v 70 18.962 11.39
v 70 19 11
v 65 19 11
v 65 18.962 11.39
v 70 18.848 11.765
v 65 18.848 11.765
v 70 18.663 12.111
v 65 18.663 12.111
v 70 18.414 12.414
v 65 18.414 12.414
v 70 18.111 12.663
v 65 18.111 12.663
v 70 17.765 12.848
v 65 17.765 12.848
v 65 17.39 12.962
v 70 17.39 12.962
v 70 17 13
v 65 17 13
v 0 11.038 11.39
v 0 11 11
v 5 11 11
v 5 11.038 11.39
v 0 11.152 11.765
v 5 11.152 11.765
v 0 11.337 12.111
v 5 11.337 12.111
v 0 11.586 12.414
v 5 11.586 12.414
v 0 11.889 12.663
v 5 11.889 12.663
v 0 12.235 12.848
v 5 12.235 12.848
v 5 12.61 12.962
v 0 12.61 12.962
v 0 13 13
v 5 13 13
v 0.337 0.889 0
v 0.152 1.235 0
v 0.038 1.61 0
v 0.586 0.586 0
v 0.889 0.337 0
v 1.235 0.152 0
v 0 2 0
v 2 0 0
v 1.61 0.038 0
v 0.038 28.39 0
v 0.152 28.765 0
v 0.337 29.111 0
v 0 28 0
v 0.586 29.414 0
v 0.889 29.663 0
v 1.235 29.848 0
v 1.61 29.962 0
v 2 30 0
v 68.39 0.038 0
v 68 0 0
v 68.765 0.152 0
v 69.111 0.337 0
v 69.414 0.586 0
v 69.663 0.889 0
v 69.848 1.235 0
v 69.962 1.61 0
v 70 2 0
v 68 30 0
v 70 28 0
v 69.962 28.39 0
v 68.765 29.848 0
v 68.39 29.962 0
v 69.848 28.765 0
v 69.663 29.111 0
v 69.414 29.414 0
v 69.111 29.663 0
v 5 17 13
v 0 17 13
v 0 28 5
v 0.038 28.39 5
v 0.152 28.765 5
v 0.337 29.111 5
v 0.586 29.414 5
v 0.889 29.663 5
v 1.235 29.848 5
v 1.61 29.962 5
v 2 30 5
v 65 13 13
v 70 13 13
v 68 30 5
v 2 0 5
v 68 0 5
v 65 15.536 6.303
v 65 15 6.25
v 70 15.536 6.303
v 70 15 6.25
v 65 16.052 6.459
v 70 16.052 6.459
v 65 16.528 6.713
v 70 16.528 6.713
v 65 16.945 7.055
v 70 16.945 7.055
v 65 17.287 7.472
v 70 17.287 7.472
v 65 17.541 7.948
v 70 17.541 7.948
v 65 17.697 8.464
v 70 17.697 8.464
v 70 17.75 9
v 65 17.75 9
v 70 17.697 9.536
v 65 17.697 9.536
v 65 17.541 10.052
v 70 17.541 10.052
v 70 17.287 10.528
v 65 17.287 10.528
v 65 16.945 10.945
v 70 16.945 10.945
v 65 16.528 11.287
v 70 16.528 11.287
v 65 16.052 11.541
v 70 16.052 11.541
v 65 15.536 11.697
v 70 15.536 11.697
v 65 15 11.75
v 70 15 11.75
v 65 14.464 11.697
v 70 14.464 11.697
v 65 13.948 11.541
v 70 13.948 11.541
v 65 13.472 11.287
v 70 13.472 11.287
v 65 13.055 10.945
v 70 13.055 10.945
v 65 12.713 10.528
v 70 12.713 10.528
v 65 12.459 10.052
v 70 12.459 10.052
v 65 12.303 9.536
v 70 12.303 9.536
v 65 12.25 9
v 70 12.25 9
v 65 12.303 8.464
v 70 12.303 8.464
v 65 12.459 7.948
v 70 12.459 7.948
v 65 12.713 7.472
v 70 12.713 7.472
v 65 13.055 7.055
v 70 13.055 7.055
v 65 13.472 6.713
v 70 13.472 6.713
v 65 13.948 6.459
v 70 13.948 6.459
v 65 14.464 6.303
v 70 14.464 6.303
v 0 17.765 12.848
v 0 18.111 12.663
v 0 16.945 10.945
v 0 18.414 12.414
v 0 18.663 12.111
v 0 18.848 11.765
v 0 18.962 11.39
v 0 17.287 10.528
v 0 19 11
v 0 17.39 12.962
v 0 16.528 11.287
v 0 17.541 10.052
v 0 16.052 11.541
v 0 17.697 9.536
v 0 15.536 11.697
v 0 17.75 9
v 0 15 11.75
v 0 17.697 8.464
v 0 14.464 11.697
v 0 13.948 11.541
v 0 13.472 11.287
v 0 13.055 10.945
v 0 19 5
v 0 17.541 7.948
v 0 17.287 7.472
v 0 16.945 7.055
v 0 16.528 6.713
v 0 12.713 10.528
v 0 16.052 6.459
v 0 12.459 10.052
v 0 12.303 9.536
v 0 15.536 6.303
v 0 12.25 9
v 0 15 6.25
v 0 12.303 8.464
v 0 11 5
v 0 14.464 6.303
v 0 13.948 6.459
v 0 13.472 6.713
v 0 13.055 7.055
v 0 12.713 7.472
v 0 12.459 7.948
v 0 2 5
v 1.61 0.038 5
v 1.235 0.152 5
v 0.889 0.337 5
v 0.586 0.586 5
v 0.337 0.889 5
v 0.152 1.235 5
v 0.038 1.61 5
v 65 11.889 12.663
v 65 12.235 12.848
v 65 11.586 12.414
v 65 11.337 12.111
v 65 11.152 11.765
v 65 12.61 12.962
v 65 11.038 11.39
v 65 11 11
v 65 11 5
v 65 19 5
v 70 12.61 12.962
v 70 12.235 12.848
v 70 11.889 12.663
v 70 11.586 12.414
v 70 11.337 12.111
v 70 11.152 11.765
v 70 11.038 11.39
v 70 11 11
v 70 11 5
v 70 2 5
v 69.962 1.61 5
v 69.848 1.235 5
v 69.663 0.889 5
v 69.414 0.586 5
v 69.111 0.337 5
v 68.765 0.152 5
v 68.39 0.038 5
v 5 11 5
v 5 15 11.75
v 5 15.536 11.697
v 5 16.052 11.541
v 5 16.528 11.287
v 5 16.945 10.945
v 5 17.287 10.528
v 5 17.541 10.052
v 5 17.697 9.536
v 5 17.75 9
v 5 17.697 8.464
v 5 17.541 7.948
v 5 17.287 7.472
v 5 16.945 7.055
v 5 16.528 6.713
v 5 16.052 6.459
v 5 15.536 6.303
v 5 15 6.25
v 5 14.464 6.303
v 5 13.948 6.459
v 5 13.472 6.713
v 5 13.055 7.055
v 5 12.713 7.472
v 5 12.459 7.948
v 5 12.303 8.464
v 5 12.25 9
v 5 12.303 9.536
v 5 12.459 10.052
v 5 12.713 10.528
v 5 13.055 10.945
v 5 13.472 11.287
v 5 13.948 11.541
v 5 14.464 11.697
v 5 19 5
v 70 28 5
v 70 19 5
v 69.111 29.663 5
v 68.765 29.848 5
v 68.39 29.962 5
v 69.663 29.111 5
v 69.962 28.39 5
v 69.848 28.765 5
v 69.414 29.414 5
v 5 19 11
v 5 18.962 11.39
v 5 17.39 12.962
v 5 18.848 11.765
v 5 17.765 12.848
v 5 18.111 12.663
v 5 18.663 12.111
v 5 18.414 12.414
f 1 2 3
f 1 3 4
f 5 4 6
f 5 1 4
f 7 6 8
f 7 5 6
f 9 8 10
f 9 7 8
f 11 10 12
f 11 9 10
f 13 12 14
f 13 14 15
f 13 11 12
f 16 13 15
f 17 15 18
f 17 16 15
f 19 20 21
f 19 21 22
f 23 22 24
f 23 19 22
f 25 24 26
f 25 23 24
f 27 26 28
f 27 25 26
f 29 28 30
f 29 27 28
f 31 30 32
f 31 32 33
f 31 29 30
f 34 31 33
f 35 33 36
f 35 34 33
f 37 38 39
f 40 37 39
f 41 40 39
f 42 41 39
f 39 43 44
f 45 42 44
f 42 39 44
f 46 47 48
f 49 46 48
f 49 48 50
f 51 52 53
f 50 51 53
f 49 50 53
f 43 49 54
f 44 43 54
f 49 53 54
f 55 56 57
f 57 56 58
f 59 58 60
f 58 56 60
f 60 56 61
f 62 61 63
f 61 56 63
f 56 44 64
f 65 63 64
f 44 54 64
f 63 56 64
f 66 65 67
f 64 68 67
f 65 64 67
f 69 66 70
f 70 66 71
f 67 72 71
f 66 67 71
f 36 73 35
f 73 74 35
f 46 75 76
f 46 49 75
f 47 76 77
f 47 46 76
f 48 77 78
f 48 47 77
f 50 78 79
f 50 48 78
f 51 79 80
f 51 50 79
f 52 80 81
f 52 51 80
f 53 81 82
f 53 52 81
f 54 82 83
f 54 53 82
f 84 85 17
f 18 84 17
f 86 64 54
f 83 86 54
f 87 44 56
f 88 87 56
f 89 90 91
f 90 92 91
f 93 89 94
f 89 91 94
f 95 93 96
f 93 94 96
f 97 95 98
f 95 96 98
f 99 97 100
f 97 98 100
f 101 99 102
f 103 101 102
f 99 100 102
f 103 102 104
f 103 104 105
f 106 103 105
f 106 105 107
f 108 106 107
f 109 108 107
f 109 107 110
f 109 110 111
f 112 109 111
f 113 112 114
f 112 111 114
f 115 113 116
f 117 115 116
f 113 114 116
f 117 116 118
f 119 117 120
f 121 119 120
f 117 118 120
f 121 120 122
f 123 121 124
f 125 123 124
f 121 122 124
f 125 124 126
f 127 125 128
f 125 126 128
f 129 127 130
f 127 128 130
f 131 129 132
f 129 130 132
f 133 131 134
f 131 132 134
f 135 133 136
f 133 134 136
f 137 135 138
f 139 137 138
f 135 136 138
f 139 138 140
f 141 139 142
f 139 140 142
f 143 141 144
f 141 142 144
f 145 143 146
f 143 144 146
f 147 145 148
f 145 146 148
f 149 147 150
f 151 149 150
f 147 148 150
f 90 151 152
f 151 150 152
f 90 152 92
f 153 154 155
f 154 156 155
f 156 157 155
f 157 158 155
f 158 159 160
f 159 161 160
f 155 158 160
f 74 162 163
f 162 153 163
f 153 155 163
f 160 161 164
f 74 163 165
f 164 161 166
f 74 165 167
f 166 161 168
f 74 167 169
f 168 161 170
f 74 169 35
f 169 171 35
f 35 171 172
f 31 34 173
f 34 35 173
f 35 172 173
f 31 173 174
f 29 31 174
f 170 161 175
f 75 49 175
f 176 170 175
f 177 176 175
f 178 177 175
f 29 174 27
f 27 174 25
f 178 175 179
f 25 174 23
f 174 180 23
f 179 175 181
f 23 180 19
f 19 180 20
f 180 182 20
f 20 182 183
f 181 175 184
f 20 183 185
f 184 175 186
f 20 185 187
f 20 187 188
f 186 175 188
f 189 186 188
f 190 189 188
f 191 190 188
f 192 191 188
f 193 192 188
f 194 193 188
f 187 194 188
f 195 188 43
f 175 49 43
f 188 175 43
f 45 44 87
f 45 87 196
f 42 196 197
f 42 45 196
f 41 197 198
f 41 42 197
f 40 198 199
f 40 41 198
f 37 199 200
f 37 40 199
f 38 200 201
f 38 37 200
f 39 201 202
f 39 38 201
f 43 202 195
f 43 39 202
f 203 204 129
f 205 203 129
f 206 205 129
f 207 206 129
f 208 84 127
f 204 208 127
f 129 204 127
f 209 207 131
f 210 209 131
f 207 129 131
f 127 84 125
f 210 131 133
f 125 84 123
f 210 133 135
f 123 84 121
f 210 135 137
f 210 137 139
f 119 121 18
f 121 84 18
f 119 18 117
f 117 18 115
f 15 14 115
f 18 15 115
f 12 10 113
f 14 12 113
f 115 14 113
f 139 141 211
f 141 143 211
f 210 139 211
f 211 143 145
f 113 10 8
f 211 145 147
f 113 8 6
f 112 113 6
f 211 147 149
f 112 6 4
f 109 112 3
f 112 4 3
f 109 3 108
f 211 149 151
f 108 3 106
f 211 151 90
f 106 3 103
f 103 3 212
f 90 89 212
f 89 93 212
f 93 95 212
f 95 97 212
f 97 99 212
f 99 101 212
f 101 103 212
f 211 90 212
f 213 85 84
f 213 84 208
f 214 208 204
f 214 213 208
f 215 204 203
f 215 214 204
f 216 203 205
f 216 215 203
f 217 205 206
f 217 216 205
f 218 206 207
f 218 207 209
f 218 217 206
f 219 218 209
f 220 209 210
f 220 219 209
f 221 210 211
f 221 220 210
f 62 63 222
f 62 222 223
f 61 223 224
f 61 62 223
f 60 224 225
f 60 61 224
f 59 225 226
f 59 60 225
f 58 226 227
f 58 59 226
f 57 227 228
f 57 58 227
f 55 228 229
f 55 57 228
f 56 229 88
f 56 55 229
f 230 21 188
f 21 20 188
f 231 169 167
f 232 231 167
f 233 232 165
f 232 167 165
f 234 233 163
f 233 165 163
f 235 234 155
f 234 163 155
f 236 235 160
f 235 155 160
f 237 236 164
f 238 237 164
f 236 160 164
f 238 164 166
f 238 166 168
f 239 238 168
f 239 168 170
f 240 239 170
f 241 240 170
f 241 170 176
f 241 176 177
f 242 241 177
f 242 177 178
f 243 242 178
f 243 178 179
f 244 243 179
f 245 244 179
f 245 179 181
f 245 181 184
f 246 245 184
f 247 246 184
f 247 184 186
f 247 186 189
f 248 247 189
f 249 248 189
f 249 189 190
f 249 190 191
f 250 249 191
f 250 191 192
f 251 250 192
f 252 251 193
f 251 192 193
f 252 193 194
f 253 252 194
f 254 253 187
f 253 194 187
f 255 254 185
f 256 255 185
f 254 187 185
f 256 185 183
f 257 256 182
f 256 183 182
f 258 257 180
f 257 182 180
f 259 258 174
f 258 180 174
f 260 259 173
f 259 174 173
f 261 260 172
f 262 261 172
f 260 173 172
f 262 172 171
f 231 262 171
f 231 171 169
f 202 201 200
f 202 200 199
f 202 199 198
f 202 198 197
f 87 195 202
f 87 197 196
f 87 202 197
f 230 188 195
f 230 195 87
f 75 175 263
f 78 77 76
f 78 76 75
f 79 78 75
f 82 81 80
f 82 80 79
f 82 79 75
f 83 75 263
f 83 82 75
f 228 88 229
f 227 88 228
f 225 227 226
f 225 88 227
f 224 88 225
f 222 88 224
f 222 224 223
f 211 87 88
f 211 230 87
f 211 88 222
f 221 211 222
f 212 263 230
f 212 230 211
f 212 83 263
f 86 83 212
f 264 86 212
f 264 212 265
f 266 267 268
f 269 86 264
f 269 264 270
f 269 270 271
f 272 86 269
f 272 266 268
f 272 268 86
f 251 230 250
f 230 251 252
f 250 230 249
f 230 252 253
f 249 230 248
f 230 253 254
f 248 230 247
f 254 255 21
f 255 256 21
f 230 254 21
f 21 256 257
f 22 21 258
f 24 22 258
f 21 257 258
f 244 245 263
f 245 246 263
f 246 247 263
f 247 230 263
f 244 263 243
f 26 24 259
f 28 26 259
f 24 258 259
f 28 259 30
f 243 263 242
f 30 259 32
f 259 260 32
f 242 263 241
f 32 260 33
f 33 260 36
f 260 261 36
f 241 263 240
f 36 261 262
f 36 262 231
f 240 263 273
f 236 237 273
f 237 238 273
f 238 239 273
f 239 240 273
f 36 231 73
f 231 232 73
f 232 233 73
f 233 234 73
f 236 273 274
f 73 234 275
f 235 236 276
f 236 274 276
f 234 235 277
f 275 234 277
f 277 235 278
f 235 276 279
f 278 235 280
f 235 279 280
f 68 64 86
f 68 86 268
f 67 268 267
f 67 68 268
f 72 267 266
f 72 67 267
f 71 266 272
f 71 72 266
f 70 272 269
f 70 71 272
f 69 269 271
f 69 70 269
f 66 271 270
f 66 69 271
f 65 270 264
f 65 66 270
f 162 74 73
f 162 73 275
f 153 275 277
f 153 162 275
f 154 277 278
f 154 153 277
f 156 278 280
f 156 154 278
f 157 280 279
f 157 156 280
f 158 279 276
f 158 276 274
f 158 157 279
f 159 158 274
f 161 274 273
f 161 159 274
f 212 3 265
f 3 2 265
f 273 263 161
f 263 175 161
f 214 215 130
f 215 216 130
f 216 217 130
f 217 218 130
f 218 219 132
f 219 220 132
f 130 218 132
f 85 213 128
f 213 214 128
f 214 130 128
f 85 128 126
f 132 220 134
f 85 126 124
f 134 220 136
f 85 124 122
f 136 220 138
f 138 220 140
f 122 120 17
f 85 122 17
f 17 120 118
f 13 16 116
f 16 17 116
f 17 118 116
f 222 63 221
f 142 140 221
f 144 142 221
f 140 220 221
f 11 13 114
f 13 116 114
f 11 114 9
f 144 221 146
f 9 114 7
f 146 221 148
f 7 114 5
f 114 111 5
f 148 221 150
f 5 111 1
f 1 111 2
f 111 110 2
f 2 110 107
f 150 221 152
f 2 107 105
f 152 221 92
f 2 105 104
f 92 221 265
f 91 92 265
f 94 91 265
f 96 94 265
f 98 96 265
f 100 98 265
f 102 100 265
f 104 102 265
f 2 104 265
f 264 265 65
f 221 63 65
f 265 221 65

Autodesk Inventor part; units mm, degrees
ref_plane "YZ Plane" through (0, 0, 0) normal (1, 0, 0) x (0, 1, 0)
ref_plane "XZ Plane" through (0, 0, 0) normal (0, 1, 0) x (-1, 0, 0)
ref_plane "XY Plane" through (0, 0, 0) normal (0, 0, 1) x (1, 0, 0)
sketch "Esquisse1" plane through (0, 0, 0) normal (0, 0, 1) x (1, 0, 0)
  line L0 (2, 0) -> (68, 0)
  line L1 (70, 2) -> (70, 28)
  line L2 (68, 30) -> (2, 30)
  line L3 (0, 28) -> (0, 2)
  arc A0 (2, 30) -> (0, 28) centre (2, 28) ccw
  arc A1 (70, 28) -> (68, 30) centre (68, 28) ccw
  arc A2 (68, 0) -> (70, 2) centre (68, 2) ccw
  arc A3 (0, 2) -> (2, 0) centre (2, 2) ccw
  point P0 (0, 0)
  point P1 (70, 30)
  point P2 (70, 0)
  point P3 (0, 30)
  dimension "d0" = 70
  dimension "d1" = 30
  dimension "d14" = 2
extrude "Extrusion1" add sketch "Esquisse1" along normal blind 5
sketch "Esquisse2" plane through (0, 0, 0) normal (-1, 0, 0) x (0, 0, 1)
  line L0 (5, 2) -> (5, 28) projected
  line L1 (5, 15) -> (5, 19)
  line L2 (5, 15) -> (5, 11)
  line L3 (5, 19) -> (11, 19)
  line L4 (13, 17) -> (13, 13)
  line L5 (11, 11) -> (5, 11)
  arc A0 (13, 17) -> (11, 19) centre (11, 17) ccw
  arc A1 (11, 11) -> (13, 13) centre (11, 13) ccw
  line L6 (5, 19) -> (12.4142, 11.5858) construction
  line L7 (5, 11) -> (12.4142, 18.4142) construction
  circle A2 centre (9, 15) radius 2.75
  line L8 (0, 2) -> (0, 28) projected
  line L9 (5, 2) -> (5, 28) projected
  line L10 (0, 2) -> (5, 2) projected
  line L11 (5, 28) -> (5, 2) projected
  line L12 (0, 28) -> (5, 28) projected
  line L13 (0, 2) -> (0, 28) projected
  line L14 (0, 2) -> (5, 2) projected
  line L15 (5, 28) -> (5, 2) projected
  line L16 (0, 28) -> (5, 28) projected
  line L17 (0, 2) -> (0, 28) projected
  line L18 (0, 28) -> (5, 28) projected
  line L19 (0, 2) -> (5, 2) projected
  point P0 (5, 0)
  point P1 (5, 30)
  point P2 (13, 19)
  dimension "d4" = 4
  dimension "d5" = 4
  dimension "d6" = 8
  dimension "d7" = 2
  dimension "d8" = 5.5
extrude "Extrusion2" add sketch "Esquisse2" against normal blind 5 contours L0 L3 A0 L4 A1 L5
sketch "Esquisse3" plane through (70, 0, 0) normal (1, 0, 0) x (0, 0, -1)
  line L0 (-11, 19) -> (-5, 19) projected
  line L1 (-5, 19) -> (-11, 19)
  line L2 (-11, 19) -> (-11, 19)
  line L3 (-13, 13) -> (-13, 17) projected
  line L4 (-13, 17) -> (-13, 13)
  line L5 (-11, 11) -> (-5, 11)
  line L6 (-5, 2) -> (-5, 28) projected
  line L7 (-5, 19) -> (-5, 11)
  arc A0 (-11, 19) -> (-13, 17) centre (-11, 17) ccw
  arc A1 (-13, 13) -> (-11, 11) centre (-11, 13) ccw
  circle A2 centre (-9, 15) radius 2.75 projected
  circle A3 centre (-9, 15) radius 2.5
  point P0 (0, 0)
  point P1 (-13, 19)
  point P2 (-5, 0)
  point P3 (-5, 30)
  dimension "d11" = 2
extrude "Extrusion3" add sketch "Esquisse3" against normal blind 5 contours L0 L6 L5 A1 L3 A0
properties part number "Pied"
